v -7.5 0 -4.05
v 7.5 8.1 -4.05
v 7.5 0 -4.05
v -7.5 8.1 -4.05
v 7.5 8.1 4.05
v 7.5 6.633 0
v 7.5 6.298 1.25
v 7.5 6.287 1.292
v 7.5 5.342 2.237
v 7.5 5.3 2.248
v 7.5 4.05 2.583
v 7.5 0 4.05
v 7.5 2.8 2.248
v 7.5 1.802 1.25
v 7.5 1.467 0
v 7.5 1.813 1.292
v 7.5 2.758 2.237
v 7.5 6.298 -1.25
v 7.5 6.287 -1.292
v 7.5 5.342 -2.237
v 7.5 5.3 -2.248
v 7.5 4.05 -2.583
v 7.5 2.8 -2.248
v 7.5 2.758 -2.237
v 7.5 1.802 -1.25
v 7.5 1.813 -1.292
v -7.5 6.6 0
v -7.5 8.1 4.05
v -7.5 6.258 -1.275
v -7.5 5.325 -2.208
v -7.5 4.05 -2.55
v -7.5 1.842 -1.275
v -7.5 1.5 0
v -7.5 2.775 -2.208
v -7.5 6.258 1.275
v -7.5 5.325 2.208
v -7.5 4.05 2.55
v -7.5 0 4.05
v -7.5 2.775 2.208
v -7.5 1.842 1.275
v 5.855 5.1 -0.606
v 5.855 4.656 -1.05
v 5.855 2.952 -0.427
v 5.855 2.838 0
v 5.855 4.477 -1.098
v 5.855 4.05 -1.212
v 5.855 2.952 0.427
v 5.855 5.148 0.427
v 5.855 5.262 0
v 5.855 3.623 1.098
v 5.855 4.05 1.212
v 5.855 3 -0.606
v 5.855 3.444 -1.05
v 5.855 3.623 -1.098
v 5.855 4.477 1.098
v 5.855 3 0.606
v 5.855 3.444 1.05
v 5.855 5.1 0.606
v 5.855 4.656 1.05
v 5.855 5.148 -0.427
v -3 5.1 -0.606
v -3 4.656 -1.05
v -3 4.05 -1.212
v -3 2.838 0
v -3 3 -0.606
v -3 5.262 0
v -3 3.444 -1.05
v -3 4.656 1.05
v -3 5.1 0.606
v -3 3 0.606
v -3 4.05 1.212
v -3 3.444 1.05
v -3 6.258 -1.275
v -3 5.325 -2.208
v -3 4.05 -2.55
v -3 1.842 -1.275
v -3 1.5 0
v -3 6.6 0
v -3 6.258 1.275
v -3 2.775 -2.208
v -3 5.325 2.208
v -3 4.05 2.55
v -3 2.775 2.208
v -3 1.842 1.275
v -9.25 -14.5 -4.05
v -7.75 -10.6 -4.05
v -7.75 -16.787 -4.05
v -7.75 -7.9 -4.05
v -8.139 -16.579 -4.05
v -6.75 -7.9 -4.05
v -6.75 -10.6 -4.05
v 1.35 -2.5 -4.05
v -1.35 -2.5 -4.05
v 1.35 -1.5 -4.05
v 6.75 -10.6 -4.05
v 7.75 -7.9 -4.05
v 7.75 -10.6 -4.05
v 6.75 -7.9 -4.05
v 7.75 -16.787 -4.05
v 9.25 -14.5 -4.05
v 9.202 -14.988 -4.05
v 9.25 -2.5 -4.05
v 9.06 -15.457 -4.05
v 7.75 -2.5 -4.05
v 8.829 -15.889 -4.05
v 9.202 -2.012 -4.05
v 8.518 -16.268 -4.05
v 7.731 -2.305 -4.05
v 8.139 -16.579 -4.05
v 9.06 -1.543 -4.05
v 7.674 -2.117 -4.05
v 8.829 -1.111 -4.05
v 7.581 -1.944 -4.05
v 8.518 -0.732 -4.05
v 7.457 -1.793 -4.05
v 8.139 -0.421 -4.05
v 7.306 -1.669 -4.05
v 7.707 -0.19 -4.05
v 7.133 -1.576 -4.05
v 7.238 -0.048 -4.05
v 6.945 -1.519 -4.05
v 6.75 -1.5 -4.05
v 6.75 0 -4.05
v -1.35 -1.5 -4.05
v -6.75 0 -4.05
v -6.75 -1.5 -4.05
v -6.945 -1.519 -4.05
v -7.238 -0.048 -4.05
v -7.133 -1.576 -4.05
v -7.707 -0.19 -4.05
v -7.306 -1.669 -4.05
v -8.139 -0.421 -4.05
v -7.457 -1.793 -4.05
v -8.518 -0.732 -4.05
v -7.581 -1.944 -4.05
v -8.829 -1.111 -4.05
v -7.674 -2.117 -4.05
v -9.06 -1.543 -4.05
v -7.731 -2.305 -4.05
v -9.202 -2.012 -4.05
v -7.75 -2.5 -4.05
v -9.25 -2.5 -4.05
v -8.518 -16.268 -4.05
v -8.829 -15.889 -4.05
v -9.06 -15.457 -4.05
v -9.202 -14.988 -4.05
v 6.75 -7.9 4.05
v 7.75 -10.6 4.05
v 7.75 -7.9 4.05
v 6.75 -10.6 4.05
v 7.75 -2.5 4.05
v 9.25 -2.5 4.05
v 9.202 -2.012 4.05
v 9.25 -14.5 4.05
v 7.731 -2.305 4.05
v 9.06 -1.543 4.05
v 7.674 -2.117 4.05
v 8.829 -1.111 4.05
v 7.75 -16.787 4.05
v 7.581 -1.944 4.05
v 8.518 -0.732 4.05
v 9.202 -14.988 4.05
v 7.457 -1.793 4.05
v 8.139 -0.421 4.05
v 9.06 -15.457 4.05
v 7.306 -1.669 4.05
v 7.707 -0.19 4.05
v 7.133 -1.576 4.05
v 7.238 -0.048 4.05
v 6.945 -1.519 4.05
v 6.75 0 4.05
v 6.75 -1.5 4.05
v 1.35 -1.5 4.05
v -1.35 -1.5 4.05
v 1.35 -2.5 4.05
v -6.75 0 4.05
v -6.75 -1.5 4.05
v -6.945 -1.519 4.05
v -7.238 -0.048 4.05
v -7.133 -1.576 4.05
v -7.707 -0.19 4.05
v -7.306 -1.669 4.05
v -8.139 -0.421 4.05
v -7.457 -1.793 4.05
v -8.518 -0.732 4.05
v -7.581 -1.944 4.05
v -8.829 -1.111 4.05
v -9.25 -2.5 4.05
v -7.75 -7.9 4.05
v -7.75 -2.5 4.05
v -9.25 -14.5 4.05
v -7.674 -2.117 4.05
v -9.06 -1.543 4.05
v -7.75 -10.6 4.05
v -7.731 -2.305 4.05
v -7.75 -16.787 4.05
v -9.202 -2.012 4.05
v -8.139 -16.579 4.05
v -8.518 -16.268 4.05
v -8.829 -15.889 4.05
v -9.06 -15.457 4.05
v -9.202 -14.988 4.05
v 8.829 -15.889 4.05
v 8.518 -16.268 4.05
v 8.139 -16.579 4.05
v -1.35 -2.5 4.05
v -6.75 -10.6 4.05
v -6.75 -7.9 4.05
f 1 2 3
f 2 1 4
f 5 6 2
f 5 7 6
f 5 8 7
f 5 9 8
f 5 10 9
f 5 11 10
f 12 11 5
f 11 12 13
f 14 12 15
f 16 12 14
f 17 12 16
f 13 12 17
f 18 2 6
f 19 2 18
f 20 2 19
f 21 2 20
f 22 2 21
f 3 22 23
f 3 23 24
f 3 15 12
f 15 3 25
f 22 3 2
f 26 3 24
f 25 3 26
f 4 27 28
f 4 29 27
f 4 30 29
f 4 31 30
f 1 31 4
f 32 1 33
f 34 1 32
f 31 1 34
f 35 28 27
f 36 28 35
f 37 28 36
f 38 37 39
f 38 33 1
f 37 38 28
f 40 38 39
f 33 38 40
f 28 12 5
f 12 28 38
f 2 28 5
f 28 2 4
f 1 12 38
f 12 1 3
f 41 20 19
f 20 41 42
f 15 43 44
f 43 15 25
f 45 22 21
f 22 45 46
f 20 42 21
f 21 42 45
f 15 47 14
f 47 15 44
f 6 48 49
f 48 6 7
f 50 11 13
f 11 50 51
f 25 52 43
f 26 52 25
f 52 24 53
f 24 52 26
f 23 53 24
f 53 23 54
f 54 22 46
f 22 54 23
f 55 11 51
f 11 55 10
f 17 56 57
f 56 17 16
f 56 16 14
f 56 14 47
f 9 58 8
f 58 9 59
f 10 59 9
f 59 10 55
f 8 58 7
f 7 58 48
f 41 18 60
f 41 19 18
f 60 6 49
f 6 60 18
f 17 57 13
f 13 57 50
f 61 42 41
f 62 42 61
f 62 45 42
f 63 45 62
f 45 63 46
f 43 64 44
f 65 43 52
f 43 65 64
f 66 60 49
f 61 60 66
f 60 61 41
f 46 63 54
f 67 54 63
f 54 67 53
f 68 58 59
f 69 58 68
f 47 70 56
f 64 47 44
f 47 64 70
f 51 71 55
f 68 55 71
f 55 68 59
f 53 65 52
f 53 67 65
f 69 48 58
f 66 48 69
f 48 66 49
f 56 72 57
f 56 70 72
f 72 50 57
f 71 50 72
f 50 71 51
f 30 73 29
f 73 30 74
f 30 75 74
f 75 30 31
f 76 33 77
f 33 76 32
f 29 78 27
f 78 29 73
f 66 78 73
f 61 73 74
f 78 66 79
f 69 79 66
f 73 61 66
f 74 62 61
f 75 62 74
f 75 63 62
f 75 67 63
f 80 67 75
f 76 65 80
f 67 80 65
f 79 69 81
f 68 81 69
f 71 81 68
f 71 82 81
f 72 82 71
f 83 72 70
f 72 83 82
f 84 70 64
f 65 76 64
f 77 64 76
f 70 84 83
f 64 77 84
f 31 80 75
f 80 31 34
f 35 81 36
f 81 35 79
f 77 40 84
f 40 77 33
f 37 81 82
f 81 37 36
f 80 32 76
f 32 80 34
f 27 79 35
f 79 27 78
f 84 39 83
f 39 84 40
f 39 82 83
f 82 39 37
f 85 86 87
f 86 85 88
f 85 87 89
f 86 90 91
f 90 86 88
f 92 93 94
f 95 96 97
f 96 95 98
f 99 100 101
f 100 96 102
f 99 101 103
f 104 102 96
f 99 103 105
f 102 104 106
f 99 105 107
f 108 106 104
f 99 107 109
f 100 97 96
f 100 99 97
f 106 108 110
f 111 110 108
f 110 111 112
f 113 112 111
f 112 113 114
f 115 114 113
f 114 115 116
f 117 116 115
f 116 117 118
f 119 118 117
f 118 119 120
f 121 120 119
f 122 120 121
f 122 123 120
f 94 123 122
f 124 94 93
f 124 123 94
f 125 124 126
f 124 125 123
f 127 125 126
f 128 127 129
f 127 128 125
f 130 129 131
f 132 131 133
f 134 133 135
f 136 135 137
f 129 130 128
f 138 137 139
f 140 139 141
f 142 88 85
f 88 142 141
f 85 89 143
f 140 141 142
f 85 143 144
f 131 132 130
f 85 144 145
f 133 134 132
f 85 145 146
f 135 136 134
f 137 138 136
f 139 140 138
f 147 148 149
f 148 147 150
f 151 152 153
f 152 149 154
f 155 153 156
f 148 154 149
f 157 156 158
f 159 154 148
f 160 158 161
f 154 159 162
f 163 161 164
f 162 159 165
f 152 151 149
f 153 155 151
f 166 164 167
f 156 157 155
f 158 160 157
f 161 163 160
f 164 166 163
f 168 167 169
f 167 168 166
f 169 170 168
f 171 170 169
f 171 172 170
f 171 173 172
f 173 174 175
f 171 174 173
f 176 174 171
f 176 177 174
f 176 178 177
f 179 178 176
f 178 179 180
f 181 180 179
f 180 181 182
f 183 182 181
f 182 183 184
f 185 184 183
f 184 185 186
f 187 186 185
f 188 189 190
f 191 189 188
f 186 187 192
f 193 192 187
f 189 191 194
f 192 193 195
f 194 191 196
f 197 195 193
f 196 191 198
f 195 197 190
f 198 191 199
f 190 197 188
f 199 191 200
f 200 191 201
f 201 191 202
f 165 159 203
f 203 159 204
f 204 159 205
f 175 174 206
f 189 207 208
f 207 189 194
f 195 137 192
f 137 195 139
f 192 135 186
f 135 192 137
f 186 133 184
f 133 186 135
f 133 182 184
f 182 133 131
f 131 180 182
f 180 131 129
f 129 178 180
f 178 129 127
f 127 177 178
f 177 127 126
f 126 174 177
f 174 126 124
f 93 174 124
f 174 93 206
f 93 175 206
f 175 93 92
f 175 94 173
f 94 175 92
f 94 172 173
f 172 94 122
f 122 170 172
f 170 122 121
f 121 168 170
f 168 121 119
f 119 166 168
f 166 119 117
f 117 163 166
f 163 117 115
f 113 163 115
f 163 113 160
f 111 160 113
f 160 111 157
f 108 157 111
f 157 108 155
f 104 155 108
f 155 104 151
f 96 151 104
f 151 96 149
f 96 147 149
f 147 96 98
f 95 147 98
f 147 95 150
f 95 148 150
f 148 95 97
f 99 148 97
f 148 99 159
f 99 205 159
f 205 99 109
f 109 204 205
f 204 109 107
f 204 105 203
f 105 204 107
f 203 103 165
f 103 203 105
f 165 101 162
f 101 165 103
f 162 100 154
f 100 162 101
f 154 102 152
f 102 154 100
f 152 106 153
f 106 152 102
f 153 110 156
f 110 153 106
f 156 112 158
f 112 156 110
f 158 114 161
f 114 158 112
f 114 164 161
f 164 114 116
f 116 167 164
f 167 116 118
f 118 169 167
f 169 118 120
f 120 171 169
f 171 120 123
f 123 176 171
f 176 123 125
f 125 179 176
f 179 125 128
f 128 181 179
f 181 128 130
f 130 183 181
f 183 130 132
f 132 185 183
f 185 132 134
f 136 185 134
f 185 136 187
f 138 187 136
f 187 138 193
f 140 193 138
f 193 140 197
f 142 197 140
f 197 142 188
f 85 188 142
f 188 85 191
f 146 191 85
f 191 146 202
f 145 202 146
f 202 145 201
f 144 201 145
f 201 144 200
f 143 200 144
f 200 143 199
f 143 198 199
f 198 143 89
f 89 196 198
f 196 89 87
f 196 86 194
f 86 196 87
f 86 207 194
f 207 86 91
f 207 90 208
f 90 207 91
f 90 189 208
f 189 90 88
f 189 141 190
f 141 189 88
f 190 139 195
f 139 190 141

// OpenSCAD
// file: filament_guide.scad
// based on: https://github.com/jcrocholl/kossel/blob/master/extruder.scad

function filament_guide_pushfit_hole_diameter(pushfit_hole_diameter, epsilon) =
	pushfit_hole_diameter + 2*epsilon;

function filament_guide_path_diameter(filament_diameter,
		filament_play_factor, epsilon) =
	filament_diameter * filament_play_factor + 2*epsilon;

function filament_guide_width(pushfit_hole_diameter, filament_diameter,
		filament_play_factor, epsilon, thickness) =
	let(fpd = filament_guide_path_diameter(filament_diameter,
		filament_play_factor, epsilon))
	let(phd = filament_guide_pushfit_hole_diameter(pushfit_hole_diameter,
		epsilon))
	max(fpd, phd) + 2*thickness;

module filament_guide(length = 10,
		filament_diameter = 1.75,
		filament_play_factor = 1.1,
		pushfit_hole_diameter = 4.6,
		thickness = 1.5,
		epsilon = 0.25) {
	width = filament_guide_width(pushfit_hole_diameter, filament_diameter,
		filament_play_factor, epsilon, thickness);

	// put on zero-line on y axis for attaching to things
	translate([0, width/2, 0])
		difference() {
			//pushfit/pneufit mount
			cube([width, width, length], center=true, $fn=8);

			//filament path chamfer
			translate([0, 0, length/2 - 1]) #
				cylinder(h = 3, r1 = 0.5, r2 = 3,
				center = true, $fn = 12);

			//filament path
			#cylinder(h = length + 1,
				d = filament_guide_path_diameter(filament_diameter,
					filament_play_factor, epsilon),
				center = true, $fn=12);

			//pushfit/pneufit mount
			translate([0, 0, -length/2 + 2]) #
				cylinder(d = filament_guide_pushfit_hole_diameter(pushfit_hole_diameter,
						epsilon),
					h = 5, center = true, $fn=12);
		}
}

filament_guide();
// file: openbeam_clip.scad
$fn = 32;

module rounded_rectangle(width = 1, height = 1, rounding = 0) {
	if (rounding > 0) {
		non_rounded_width = width - 2*rounding;
		non_rounded_height = height - 2*rounding;

		// correct for funky minkowski displacement
		translate([-non_rounded_width/2, -non_rounded_height/2])
			minkowski() {
				square([non_rounded_width, non_rounded_height], center = true);
				translate([non_rounded_width/2, non_rounded_height/2, 0])
					circle(rounding, center = true);
			}
	} else {
		// minkowski doesn't work properly on circle with diameter 0
		square([width, height], center = true);
	}
}

function openbeam_clip_outer_width(beam_width, thickness) =
	beam_width + 2*thickness;

module openbeam_clip_cross(beam_width, rounding, thickness) {
	difference() {
		outer_width = openbeam_clip_outer_width(beam_width = beam_width,
			thickness = thickness);

		// since clip is open at the bottom, remove one thickness and
		// move down by half of that to be back in center
		translate([0, thickness/2, 0])
			rounded_rectangle(width = outer_width,
				height = outer_width - thickness,
				rounding = rounding + thickness);

		// make inner rectangle higher than outer by one thickness
		// (to be on the safe side) and shift down by
		// half of that to be centered with the outer again
		translate([0, -thickness/2, 0])
			rounded_rectangle(width = beam_width,
				height = beam_width + thickness,
				rounding = rounding);
	}
}

module openbeam_clip_stay(slot_width = 3.2, protrusion = 0.75) {
	square([slot_width, protrusion], center = true);
}

module openbeam_clip(beam_width = 15, height = 15,
		beam_slot_width = 3.2, stay_protrusion = 1,
		rounding = 1, thickness = 1.5,
		epsilon = 0.25) {
	cbw = beam_width + 2*epsilon;
	outer_width = openbeam_clip_outer_width(beam_width = cbw, thickness = thickness);

	// move back into center after extrude but put top onto y as base-line
	// for attaching things to it
	translate([0, -outer_width/2, -height/2])
		linear_extrude(height)
			union() {
				openbeam_clip_cross(beam_width = cbw,
					rounding = rounding,
					thickness = thickness);

				// add in the stays
				stay_position = cbw/2 - stay_protrusion/2;
				cbsw = beam_slot_width - 2*epsilon;
				for (stay_angle =[-90:90:90])
					rotate([0, 0, stay_angle])
						translate([0, stay_position, 0])
						openbeam_clip_stay(slot_width = cbsw,
							protrusion = stay_protrusion);
			}
}

openbeam_clip();
// main file
$fn = 32;
use <openbeam_clip.scad>;
use <filament_guide.scad>;

module openbeam_tube_clip(beam_width = 15,
		pushfit_hole_diameter = 4.6,
		filament_diameter = 1.75,
		filament_play_factor = 1.1,
		thickness = 1.5,
		epsilon = 0.25) {
	union() {
		height = filament_guide_width(pushfit_hole_diameter, filament_diameter,
			filament_play_factor, epsilon, thickness);
		openbeam_clip(beam_width = beam_width,
			height = height,
			thickness = thickness,
			epsilon = 0.25);

		translate([0, filament_guide_width(height)/2, 0])
			rotate([0, 90, 0])
			filament_guide(width = height,
				length = beam_width,
				epsilon = epsilon);
	}
}

openbeam_tube_clip();
